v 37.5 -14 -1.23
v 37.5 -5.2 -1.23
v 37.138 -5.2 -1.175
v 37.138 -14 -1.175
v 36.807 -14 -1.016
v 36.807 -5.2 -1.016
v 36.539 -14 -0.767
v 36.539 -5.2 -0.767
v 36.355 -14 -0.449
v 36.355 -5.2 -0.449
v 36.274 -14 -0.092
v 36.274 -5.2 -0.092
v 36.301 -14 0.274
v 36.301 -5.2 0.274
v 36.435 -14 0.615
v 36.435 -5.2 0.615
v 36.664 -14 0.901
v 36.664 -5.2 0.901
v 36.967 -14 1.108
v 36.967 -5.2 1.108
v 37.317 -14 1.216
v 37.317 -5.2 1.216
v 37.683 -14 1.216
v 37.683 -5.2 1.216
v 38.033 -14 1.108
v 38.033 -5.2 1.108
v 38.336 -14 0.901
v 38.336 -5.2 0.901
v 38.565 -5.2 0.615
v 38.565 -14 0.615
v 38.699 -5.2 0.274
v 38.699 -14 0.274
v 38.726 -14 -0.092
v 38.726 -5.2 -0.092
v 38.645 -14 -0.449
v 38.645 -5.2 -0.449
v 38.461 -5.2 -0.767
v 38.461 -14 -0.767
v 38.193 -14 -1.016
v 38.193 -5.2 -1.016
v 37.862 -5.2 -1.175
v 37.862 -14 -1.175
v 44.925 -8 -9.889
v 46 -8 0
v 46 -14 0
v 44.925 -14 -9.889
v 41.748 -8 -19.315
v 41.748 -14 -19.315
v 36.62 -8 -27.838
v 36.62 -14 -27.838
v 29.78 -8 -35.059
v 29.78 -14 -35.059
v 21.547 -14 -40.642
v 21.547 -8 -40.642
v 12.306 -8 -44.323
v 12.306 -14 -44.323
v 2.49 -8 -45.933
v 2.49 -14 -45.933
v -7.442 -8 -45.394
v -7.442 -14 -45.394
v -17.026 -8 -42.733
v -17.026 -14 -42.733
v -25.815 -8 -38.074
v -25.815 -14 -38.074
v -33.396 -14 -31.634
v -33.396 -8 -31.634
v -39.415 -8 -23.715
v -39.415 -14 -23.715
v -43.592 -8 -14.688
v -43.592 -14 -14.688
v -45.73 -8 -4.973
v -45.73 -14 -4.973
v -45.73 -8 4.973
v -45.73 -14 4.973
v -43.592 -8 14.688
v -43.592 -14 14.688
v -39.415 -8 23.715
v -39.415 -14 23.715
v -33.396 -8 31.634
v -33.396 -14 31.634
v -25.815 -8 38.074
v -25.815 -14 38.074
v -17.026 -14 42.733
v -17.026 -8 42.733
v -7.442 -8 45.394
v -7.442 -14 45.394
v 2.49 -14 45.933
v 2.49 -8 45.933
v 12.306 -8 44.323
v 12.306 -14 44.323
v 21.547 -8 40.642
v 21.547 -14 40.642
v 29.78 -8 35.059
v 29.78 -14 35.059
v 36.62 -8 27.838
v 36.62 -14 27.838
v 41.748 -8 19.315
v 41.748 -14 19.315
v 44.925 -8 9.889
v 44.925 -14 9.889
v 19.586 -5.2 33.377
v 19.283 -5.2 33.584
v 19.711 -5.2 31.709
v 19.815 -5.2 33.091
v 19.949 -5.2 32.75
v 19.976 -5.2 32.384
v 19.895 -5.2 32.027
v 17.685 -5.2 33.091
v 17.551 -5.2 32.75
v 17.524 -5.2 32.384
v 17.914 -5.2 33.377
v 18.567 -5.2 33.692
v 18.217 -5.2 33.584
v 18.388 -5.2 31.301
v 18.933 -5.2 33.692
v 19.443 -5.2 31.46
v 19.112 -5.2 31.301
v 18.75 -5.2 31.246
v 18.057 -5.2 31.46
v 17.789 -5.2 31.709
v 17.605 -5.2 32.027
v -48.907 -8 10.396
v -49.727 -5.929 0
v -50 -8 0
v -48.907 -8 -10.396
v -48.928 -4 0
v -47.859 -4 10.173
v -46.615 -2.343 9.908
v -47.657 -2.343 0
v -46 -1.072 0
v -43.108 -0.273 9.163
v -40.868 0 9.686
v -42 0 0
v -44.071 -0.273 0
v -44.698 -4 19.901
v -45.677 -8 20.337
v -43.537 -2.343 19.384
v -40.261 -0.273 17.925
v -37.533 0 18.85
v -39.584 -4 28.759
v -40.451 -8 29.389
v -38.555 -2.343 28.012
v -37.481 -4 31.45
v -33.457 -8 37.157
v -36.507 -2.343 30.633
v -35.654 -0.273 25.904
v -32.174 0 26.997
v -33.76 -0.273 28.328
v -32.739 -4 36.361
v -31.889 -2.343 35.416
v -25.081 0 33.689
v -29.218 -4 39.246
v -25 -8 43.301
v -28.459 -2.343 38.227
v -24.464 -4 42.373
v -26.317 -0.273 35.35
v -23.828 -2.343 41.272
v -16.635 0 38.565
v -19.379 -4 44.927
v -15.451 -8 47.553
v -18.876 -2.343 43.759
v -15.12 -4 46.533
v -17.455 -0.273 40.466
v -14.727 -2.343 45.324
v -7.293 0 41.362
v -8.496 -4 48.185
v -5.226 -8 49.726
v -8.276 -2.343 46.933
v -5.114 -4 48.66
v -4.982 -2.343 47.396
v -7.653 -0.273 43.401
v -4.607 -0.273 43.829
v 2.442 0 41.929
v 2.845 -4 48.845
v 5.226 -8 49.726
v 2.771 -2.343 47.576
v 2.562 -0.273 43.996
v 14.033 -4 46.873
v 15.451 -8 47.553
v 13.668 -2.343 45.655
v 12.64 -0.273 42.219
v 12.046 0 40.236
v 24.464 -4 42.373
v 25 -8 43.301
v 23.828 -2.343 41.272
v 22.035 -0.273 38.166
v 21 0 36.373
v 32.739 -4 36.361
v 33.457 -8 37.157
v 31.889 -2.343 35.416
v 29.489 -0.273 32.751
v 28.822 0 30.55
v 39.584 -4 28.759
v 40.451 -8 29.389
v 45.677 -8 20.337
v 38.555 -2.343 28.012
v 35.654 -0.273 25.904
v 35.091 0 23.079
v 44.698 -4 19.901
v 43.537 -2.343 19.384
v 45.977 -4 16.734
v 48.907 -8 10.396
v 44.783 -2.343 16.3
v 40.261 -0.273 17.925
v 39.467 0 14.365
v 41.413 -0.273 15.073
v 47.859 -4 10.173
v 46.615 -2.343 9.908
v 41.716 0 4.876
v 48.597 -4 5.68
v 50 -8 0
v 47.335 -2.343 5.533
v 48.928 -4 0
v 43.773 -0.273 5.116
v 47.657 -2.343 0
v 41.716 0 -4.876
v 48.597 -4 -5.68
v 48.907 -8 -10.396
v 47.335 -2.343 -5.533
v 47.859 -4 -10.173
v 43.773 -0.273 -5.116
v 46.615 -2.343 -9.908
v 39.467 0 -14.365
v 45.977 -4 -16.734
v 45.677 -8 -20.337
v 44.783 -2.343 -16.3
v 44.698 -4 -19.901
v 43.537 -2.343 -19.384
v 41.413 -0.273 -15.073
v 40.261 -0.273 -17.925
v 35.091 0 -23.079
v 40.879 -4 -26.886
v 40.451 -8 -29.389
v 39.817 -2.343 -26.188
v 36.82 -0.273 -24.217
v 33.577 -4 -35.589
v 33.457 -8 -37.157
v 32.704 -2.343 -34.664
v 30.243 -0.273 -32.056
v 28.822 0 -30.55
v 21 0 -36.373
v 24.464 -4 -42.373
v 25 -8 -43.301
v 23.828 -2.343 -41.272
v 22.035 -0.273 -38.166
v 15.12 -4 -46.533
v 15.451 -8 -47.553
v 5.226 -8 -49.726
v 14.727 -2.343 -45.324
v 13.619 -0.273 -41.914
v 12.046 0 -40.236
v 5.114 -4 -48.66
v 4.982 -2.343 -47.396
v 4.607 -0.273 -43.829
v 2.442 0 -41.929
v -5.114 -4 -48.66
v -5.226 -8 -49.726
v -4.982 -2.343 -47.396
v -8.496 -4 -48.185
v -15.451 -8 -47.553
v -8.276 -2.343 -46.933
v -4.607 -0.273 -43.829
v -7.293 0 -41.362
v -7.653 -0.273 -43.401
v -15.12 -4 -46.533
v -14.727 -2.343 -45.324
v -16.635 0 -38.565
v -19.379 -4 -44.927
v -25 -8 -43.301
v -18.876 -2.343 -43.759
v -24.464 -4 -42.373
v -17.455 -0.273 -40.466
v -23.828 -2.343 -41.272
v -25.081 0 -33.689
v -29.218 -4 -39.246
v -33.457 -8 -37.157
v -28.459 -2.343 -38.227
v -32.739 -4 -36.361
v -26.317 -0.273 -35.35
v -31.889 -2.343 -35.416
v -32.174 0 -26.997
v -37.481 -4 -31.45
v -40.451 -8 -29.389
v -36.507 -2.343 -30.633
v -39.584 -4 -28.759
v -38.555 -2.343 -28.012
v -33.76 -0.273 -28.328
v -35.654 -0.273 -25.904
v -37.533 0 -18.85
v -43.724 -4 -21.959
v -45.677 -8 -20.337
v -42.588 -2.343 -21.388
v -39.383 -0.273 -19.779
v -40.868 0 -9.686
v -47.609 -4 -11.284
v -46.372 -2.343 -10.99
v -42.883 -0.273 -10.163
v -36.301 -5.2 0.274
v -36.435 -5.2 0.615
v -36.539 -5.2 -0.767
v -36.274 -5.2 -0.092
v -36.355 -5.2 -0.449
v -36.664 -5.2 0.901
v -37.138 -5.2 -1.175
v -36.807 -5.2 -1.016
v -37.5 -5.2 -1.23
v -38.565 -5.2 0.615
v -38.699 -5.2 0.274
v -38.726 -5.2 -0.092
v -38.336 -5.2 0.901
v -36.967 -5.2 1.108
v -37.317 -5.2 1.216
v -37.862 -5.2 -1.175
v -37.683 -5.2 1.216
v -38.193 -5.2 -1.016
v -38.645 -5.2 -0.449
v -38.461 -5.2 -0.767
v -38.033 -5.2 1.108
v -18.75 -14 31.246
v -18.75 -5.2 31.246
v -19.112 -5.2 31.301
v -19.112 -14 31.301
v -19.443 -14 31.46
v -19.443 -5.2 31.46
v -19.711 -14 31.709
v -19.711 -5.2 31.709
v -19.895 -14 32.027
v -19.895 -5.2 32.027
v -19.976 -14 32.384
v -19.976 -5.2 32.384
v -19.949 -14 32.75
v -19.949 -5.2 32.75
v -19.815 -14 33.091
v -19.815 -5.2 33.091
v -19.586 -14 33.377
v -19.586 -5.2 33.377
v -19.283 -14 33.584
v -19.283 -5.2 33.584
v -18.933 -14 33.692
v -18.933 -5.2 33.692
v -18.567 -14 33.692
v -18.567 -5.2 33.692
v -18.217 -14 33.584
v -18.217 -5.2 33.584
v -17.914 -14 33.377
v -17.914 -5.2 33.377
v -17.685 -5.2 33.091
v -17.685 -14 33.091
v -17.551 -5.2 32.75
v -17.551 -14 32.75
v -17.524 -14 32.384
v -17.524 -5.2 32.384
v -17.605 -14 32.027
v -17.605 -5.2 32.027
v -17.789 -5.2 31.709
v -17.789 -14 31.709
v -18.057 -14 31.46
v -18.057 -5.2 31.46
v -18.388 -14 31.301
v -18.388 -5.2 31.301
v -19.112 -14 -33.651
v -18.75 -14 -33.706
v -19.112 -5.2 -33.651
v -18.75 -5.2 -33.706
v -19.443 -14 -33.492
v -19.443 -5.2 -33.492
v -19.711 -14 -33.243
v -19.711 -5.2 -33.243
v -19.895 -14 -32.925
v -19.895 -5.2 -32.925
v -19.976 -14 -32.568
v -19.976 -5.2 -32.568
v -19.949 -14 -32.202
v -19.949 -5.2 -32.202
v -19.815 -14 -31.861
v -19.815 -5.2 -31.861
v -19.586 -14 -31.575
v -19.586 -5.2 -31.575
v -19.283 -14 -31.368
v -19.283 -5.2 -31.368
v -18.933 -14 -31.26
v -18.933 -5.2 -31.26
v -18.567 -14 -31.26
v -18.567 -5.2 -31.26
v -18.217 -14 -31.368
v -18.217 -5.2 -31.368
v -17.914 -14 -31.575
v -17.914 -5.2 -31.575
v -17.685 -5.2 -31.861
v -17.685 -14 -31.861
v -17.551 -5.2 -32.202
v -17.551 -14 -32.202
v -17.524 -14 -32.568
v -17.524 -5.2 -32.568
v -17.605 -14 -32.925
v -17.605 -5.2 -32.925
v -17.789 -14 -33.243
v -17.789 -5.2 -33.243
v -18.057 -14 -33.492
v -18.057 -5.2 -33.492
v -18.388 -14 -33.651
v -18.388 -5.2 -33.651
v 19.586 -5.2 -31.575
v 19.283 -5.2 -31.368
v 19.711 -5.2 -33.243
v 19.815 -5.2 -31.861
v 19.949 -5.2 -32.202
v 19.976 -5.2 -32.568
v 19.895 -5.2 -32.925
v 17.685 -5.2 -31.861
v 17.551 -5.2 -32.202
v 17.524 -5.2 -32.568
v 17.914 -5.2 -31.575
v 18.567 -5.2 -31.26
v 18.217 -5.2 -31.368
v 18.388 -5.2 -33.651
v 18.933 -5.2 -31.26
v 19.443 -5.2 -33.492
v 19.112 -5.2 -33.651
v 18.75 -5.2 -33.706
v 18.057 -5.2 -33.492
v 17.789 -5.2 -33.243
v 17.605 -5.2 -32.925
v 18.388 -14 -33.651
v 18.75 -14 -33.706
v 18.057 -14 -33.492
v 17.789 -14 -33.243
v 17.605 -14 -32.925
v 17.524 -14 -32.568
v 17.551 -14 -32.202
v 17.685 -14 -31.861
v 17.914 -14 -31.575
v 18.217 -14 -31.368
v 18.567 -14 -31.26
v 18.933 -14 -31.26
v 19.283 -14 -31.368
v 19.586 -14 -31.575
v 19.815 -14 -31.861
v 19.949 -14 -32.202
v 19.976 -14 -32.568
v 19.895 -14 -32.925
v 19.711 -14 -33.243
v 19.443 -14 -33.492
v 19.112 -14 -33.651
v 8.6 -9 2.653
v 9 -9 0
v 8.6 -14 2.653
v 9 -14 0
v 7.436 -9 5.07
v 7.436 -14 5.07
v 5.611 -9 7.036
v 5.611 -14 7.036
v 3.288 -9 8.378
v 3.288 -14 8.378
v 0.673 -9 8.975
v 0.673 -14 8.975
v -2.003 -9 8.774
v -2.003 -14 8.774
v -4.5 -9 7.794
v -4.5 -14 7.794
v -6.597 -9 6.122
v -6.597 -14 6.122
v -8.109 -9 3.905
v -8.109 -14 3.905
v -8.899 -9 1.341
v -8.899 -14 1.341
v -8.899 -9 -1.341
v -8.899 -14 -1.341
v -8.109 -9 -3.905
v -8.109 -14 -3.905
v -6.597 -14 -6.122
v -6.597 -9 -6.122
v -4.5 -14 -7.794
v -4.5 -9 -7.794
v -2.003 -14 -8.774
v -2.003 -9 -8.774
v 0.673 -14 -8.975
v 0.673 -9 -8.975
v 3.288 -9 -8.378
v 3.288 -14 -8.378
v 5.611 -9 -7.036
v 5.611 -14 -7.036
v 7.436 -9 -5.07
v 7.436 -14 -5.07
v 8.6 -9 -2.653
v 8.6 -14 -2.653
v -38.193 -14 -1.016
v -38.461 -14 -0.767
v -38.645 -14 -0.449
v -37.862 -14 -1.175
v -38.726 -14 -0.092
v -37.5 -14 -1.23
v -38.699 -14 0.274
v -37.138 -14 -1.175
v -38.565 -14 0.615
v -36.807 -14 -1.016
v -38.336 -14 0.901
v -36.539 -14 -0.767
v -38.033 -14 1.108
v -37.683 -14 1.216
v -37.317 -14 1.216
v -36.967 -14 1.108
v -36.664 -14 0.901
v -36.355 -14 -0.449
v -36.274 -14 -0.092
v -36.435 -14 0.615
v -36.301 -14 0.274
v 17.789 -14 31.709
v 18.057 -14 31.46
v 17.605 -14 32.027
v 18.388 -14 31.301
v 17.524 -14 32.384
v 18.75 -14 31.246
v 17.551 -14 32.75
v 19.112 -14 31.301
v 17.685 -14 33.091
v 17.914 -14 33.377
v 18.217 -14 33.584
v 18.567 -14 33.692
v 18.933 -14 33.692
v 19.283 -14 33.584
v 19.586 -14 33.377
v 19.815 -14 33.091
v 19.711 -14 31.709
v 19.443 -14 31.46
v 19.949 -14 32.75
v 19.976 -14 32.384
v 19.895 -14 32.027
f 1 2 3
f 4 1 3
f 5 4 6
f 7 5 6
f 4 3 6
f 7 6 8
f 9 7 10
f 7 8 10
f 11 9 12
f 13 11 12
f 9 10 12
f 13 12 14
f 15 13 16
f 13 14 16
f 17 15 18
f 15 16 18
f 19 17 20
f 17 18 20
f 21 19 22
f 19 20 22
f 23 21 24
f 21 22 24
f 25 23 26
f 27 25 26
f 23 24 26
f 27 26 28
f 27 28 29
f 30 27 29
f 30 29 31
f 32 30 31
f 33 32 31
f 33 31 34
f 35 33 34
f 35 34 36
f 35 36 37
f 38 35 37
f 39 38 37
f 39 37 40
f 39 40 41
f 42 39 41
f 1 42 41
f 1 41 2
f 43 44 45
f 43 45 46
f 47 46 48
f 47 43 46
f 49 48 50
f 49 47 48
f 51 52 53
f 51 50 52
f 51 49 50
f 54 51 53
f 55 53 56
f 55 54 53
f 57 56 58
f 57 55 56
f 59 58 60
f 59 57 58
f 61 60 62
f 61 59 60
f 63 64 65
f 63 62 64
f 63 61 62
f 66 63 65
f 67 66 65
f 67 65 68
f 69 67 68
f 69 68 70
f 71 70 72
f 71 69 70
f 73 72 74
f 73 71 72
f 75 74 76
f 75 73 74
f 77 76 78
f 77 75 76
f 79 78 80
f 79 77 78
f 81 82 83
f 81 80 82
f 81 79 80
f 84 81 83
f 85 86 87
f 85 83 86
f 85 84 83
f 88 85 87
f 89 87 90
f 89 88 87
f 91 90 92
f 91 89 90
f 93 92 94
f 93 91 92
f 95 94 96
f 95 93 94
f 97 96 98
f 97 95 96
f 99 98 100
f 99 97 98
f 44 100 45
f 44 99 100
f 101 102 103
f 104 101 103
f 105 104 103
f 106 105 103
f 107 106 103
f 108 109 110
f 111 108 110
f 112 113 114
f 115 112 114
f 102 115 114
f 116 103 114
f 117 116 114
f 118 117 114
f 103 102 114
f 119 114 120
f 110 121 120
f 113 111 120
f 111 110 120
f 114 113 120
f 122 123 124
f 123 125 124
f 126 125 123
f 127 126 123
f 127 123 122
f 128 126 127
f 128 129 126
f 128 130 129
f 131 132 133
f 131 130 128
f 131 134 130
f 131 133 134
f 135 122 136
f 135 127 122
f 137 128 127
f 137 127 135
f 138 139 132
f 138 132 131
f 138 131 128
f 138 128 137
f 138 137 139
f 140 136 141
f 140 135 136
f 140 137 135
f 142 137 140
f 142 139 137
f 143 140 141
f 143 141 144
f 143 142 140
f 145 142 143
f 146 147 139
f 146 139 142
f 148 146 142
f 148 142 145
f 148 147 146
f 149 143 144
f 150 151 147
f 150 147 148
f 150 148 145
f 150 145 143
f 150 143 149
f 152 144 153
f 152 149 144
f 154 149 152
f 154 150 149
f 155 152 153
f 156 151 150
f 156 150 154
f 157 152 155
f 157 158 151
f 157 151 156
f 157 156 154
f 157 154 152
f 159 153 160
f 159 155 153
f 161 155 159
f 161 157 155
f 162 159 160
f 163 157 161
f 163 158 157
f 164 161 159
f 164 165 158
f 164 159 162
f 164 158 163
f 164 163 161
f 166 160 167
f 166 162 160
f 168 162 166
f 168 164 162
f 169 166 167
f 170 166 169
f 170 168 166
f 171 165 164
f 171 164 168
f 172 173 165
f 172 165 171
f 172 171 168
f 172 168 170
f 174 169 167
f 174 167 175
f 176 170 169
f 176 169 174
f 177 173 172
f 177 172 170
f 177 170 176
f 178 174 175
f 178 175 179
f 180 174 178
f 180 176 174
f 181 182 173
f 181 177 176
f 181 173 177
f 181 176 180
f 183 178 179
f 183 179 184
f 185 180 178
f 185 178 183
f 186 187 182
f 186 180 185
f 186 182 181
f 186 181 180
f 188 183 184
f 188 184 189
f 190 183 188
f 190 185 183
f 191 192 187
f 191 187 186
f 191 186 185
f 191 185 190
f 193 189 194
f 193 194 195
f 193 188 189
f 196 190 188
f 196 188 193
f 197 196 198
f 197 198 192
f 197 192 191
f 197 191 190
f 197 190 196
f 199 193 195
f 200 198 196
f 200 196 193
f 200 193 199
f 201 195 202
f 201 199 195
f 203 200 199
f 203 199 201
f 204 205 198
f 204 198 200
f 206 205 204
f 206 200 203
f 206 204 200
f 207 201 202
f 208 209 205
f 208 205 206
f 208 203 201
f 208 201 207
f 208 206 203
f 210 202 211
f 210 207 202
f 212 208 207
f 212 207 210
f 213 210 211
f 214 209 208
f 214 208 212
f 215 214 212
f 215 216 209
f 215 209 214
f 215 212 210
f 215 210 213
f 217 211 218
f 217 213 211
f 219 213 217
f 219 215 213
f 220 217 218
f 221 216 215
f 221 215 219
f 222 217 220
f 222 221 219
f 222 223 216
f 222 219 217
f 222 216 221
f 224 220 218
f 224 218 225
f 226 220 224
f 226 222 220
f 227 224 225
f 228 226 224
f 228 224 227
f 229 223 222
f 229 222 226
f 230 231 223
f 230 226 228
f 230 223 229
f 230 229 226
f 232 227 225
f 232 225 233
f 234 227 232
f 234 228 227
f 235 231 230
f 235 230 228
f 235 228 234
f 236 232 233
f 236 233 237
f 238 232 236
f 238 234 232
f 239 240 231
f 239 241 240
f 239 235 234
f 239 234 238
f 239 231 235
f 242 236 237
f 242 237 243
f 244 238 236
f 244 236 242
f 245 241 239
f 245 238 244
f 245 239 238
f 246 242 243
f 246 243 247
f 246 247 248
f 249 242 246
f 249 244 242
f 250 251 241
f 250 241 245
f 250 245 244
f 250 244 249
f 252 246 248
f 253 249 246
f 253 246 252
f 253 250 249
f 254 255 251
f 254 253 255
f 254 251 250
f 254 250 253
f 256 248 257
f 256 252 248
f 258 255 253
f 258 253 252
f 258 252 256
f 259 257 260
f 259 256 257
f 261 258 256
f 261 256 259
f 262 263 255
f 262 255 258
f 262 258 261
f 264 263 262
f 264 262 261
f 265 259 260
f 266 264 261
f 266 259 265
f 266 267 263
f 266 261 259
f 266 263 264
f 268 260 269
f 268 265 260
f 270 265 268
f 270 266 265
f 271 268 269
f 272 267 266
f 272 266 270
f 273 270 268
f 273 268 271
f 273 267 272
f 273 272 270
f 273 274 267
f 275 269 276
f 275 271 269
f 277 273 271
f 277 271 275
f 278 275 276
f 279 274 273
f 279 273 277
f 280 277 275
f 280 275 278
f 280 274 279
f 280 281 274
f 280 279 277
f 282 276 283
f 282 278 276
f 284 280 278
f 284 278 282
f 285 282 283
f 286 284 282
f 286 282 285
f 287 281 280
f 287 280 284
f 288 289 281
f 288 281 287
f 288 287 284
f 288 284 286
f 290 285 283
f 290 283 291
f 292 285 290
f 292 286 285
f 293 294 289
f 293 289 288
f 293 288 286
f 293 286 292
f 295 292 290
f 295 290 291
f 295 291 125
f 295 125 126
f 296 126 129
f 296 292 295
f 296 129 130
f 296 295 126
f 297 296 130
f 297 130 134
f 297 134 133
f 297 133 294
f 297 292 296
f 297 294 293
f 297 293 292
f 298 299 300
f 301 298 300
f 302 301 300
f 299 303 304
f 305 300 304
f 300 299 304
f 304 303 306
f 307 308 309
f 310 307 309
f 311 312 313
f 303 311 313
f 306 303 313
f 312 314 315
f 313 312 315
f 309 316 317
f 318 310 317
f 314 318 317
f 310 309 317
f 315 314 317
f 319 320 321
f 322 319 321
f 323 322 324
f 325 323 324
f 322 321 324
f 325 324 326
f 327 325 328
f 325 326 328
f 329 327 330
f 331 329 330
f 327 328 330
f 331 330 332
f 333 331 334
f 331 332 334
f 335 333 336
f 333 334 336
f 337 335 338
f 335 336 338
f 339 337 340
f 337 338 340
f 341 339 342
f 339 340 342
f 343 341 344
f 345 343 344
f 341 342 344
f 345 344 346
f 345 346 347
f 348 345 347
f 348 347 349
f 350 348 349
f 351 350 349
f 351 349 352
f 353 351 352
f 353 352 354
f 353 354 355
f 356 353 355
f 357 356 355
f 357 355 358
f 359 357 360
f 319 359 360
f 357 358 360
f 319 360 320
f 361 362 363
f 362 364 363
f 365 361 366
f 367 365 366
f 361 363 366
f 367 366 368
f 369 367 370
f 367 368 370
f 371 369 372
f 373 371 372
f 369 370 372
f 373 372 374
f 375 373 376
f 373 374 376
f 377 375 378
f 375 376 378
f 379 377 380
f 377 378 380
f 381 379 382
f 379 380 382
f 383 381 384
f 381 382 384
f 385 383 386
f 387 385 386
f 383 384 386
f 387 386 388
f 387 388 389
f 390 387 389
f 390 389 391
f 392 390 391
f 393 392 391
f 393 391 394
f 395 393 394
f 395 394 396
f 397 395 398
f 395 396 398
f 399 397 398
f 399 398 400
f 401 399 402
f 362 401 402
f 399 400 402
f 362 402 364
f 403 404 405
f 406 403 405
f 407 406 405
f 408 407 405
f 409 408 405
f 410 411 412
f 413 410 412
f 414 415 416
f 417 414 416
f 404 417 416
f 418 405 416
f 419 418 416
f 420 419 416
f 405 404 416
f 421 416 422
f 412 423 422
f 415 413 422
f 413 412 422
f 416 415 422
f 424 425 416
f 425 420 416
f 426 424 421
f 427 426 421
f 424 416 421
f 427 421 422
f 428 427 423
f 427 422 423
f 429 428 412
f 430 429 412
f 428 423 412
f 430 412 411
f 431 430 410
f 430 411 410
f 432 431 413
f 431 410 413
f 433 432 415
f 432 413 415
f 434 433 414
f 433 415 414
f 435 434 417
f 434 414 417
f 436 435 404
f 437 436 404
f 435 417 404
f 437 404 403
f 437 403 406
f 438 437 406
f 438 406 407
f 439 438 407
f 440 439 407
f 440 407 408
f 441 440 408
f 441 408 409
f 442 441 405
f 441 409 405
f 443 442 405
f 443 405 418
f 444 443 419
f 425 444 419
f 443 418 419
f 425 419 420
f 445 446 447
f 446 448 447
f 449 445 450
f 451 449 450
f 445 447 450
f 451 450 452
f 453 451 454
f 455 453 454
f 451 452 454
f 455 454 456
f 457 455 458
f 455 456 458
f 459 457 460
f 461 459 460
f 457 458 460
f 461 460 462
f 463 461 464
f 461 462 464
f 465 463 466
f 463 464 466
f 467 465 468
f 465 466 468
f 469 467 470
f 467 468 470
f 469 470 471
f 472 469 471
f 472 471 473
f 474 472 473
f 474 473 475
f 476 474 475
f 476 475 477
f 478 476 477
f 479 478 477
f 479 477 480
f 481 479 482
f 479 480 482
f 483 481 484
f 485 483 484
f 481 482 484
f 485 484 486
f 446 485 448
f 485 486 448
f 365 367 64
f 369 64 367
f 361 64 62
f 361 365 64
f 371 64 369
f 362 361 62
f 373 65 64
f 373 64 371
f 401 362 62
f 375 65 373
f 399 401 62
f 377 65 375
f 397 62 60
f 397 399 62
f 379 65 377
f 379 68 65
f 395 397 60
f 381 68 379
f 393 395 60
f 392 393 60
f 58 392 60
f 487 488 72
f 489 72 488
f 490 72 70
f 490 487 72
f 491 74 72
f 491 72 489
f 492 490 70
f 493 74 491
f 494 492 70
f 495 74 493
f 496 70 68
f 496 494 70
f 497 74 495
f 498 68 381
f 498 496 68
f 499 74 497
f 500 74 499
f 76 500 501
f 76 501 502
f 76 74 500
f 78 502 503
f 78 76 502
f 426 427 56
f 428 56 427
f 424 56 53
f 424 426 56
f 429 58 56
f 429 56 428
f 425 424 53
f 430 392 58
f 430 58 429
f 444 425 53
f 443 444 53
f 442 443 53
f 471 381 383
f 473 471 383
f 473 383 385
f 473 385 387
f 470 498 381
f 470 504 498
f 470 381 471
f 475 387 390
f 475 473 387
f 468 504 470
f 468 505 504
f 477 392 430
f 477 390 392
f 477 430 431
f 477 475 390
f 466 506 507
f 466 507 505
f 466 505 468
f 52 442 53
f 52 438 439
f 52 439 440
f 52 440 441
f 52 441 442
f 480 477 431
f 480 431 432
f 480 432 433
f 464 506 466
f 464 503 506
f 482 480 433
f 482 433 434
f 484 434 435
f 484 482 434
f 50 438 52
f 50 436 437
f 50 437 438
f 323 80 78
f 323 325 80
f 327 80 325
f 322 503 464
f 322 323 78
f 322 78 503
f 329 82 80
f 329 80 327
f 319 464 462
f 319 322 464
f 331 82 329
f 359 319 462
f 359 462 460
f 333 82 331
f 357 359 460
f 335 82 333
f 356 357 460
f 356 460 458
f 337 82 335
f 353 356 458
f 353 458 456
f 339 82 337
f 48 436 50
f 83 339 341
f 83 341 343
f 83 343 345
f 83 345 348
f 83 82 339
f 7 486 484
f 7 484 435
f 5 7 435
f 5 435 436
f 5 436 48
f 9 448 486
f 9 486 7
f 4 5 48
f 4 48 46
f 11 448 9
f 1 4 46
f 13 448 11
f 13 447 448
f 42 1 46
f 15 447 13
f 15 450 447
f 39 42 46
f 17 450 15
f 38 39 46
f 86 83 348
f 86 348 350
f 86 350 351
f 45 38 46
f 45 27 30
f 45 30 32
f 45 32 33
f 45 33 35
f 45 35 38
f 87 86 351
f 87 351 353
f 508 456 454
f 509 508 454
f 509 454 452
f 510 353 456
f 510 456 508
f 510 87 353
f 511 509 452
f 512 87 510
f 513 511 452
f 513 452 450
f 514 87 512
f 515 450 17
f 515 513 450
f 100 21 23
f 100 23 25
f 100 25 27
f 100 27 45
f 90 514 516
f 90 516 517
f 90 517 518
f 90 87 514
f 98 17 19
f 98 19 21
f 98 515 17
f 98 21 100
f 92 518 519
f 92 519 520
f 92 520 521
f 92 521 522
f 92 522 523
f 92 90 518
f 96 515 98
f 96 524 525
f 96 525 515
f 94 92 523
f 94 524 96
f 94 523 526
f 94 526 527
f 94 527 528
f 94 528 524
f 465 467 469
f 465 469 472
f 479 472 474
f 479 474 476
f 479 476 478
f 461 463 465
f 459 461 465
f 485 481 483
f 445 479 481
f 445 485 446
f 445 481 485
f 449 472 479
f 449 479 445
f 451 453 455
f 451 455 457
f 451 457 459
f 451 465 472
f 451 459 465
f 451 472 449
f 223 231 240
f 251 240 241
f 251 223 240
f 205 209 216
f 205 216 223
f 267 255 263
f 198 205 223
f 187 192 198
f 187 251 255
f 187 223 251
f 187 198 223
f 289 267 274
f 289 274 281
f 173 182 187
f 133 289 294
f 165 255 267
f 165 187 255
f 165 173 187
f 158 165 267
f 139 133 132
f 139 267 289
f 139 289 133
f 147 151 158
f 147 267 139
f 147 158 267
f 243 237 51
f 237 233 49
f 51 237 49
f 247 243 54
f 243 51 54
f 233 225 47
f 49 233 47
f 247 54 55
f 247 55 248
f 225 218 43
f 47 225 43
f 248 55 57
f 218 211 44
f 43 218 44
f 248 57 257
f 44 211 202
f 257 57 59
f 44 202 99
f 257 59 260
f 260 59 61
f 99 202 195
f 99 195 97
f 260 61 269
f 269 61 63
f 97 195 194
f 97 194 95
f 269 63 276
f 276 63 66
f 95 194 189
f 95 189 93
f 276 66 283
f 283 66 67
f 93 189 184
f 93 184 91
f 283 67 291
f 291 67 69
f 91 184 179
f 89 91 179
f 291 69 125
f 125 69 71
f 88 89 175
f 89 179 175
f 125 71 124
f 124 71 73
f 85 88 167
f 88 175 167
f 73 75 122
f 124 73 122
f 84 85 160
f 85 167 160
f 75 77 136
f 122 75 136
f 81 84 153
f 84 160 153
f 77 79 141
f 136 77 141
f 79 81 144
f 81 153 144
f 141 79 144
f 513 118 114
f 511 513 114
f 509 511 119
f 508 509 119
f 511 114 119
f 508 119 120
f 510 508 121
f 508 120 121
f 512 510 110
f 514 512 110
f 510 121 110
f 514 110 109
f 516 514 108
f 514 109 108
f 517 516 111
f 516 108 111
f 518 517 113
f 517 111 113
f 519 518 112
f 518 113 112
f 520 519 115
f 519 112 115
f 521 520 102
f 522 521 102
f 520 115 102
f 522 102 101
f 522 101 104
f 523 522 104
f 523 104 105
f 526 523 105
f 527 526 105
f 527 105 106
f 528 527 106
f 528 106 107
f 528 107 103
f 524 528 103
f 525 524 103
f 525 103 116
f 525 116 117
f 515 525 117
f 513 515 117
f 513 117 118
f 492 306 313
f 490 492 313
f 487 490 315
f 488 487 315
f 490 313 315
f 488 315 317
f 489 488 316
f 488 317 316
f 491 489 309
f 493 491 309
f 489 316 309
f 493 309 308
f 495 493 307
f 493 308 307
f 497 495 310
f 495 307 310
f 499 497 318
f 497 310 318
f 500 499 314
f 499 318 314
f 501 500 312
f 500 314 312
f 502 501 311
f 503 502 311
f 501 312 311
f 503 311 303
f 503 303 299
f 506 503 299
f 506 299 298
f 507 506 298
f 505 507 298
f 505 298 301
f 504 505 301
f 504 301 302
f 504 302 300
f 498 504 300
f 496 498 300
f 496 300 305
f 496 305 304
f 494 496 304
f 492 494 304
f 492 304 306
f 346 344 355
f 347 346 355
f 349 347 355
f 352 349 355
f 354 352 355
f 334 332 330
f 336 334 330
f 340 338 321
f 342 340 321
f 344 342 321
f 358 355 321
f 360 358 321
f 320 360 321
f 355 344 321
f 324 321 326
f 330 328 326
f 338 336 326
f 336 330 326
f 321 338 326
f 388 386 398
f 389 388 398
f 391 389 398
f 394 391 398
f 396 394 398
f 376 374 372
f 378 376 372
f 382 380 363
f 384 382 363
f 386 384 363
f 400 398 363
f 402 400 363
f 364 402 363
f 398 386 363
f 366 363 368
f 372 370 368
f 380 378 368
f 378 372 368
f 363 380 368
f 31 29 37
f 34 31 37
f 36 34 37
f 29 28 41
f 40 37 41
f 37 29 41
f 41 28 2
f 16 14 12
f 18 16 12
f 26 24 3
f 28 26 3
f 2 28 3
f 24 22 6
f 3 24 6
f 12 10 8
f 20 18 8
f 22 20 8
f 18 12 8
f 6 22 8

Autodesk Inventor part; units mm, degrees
ref_plane "YZ Plane" through (0, 0, 0) normal (1, 0, 0) x (0, 1, 0)
ref_plane "XZ Plane" through (0, 0, 0) normal (0, 1, 0) x (-1, 0, 0)
ref_plane "XY Plane" through (0, 0, 0) normal (0, 0, 1) x (1, 0, 0)
sketch "Boceto1" plane through (0, 0, 0) normal (0, 1, 0) x (-1, 0, 0)
  circle A0 centre (0, 0) radius 50
  dimension "Diametro" = 100
extrude "Extrusión1" add sketch "Boceto1" against normal blind 8
fillet "Empalme1" radius 8 1 edges at (50, 0, 0)
sketch "Boceto2" plane through (0, -8, 0) normal (0, -1, 0) x (1, 0, 0)
  circle A0 centre (0, 0) radius 46
  circle A1 centre (0, 0) radius 50 projected
  dimension "d22" = 4
extrude "Extrusión3" add sketch "Boceto2" along normal blind 6 contours A0
sketch "Boceto3" plane through (0, -14, 0) normal (0, -1, 0) x (1, 0, 0)
  circle A0 centre (0, 0) radius 9
  point P0 (-37.5, 0)
  point P1 (-18.75, -32.476)
  point P2 (18.75, -32.476)
  point P3 (37.5, 0)
  point P4 (18.75, 32.476)
  point P5 (-18.75, 32.476)
  dimension "d25" = 37.5
  dimension "d35" = 360
  dimension "d37" = 18
hole "Agujero2" at (-37.5, -14, 0) at (-18.75, -14, 32.476) at (-18.75, -14, -32.476) at (18.75, -14, 32.476) at (37.5, -14, 0) at (18.75, -14, -32.476) direction (0, 1, 0) diameter 2.459 depth 8.8 thread size "M3x0.5" class "6H" standard "ANSI Metric M Profile"
extrude "Extrusión4" cut sketch "Boceto3" against normal blind 5
properties part number "Tapa" material "Aluminio 6061"
